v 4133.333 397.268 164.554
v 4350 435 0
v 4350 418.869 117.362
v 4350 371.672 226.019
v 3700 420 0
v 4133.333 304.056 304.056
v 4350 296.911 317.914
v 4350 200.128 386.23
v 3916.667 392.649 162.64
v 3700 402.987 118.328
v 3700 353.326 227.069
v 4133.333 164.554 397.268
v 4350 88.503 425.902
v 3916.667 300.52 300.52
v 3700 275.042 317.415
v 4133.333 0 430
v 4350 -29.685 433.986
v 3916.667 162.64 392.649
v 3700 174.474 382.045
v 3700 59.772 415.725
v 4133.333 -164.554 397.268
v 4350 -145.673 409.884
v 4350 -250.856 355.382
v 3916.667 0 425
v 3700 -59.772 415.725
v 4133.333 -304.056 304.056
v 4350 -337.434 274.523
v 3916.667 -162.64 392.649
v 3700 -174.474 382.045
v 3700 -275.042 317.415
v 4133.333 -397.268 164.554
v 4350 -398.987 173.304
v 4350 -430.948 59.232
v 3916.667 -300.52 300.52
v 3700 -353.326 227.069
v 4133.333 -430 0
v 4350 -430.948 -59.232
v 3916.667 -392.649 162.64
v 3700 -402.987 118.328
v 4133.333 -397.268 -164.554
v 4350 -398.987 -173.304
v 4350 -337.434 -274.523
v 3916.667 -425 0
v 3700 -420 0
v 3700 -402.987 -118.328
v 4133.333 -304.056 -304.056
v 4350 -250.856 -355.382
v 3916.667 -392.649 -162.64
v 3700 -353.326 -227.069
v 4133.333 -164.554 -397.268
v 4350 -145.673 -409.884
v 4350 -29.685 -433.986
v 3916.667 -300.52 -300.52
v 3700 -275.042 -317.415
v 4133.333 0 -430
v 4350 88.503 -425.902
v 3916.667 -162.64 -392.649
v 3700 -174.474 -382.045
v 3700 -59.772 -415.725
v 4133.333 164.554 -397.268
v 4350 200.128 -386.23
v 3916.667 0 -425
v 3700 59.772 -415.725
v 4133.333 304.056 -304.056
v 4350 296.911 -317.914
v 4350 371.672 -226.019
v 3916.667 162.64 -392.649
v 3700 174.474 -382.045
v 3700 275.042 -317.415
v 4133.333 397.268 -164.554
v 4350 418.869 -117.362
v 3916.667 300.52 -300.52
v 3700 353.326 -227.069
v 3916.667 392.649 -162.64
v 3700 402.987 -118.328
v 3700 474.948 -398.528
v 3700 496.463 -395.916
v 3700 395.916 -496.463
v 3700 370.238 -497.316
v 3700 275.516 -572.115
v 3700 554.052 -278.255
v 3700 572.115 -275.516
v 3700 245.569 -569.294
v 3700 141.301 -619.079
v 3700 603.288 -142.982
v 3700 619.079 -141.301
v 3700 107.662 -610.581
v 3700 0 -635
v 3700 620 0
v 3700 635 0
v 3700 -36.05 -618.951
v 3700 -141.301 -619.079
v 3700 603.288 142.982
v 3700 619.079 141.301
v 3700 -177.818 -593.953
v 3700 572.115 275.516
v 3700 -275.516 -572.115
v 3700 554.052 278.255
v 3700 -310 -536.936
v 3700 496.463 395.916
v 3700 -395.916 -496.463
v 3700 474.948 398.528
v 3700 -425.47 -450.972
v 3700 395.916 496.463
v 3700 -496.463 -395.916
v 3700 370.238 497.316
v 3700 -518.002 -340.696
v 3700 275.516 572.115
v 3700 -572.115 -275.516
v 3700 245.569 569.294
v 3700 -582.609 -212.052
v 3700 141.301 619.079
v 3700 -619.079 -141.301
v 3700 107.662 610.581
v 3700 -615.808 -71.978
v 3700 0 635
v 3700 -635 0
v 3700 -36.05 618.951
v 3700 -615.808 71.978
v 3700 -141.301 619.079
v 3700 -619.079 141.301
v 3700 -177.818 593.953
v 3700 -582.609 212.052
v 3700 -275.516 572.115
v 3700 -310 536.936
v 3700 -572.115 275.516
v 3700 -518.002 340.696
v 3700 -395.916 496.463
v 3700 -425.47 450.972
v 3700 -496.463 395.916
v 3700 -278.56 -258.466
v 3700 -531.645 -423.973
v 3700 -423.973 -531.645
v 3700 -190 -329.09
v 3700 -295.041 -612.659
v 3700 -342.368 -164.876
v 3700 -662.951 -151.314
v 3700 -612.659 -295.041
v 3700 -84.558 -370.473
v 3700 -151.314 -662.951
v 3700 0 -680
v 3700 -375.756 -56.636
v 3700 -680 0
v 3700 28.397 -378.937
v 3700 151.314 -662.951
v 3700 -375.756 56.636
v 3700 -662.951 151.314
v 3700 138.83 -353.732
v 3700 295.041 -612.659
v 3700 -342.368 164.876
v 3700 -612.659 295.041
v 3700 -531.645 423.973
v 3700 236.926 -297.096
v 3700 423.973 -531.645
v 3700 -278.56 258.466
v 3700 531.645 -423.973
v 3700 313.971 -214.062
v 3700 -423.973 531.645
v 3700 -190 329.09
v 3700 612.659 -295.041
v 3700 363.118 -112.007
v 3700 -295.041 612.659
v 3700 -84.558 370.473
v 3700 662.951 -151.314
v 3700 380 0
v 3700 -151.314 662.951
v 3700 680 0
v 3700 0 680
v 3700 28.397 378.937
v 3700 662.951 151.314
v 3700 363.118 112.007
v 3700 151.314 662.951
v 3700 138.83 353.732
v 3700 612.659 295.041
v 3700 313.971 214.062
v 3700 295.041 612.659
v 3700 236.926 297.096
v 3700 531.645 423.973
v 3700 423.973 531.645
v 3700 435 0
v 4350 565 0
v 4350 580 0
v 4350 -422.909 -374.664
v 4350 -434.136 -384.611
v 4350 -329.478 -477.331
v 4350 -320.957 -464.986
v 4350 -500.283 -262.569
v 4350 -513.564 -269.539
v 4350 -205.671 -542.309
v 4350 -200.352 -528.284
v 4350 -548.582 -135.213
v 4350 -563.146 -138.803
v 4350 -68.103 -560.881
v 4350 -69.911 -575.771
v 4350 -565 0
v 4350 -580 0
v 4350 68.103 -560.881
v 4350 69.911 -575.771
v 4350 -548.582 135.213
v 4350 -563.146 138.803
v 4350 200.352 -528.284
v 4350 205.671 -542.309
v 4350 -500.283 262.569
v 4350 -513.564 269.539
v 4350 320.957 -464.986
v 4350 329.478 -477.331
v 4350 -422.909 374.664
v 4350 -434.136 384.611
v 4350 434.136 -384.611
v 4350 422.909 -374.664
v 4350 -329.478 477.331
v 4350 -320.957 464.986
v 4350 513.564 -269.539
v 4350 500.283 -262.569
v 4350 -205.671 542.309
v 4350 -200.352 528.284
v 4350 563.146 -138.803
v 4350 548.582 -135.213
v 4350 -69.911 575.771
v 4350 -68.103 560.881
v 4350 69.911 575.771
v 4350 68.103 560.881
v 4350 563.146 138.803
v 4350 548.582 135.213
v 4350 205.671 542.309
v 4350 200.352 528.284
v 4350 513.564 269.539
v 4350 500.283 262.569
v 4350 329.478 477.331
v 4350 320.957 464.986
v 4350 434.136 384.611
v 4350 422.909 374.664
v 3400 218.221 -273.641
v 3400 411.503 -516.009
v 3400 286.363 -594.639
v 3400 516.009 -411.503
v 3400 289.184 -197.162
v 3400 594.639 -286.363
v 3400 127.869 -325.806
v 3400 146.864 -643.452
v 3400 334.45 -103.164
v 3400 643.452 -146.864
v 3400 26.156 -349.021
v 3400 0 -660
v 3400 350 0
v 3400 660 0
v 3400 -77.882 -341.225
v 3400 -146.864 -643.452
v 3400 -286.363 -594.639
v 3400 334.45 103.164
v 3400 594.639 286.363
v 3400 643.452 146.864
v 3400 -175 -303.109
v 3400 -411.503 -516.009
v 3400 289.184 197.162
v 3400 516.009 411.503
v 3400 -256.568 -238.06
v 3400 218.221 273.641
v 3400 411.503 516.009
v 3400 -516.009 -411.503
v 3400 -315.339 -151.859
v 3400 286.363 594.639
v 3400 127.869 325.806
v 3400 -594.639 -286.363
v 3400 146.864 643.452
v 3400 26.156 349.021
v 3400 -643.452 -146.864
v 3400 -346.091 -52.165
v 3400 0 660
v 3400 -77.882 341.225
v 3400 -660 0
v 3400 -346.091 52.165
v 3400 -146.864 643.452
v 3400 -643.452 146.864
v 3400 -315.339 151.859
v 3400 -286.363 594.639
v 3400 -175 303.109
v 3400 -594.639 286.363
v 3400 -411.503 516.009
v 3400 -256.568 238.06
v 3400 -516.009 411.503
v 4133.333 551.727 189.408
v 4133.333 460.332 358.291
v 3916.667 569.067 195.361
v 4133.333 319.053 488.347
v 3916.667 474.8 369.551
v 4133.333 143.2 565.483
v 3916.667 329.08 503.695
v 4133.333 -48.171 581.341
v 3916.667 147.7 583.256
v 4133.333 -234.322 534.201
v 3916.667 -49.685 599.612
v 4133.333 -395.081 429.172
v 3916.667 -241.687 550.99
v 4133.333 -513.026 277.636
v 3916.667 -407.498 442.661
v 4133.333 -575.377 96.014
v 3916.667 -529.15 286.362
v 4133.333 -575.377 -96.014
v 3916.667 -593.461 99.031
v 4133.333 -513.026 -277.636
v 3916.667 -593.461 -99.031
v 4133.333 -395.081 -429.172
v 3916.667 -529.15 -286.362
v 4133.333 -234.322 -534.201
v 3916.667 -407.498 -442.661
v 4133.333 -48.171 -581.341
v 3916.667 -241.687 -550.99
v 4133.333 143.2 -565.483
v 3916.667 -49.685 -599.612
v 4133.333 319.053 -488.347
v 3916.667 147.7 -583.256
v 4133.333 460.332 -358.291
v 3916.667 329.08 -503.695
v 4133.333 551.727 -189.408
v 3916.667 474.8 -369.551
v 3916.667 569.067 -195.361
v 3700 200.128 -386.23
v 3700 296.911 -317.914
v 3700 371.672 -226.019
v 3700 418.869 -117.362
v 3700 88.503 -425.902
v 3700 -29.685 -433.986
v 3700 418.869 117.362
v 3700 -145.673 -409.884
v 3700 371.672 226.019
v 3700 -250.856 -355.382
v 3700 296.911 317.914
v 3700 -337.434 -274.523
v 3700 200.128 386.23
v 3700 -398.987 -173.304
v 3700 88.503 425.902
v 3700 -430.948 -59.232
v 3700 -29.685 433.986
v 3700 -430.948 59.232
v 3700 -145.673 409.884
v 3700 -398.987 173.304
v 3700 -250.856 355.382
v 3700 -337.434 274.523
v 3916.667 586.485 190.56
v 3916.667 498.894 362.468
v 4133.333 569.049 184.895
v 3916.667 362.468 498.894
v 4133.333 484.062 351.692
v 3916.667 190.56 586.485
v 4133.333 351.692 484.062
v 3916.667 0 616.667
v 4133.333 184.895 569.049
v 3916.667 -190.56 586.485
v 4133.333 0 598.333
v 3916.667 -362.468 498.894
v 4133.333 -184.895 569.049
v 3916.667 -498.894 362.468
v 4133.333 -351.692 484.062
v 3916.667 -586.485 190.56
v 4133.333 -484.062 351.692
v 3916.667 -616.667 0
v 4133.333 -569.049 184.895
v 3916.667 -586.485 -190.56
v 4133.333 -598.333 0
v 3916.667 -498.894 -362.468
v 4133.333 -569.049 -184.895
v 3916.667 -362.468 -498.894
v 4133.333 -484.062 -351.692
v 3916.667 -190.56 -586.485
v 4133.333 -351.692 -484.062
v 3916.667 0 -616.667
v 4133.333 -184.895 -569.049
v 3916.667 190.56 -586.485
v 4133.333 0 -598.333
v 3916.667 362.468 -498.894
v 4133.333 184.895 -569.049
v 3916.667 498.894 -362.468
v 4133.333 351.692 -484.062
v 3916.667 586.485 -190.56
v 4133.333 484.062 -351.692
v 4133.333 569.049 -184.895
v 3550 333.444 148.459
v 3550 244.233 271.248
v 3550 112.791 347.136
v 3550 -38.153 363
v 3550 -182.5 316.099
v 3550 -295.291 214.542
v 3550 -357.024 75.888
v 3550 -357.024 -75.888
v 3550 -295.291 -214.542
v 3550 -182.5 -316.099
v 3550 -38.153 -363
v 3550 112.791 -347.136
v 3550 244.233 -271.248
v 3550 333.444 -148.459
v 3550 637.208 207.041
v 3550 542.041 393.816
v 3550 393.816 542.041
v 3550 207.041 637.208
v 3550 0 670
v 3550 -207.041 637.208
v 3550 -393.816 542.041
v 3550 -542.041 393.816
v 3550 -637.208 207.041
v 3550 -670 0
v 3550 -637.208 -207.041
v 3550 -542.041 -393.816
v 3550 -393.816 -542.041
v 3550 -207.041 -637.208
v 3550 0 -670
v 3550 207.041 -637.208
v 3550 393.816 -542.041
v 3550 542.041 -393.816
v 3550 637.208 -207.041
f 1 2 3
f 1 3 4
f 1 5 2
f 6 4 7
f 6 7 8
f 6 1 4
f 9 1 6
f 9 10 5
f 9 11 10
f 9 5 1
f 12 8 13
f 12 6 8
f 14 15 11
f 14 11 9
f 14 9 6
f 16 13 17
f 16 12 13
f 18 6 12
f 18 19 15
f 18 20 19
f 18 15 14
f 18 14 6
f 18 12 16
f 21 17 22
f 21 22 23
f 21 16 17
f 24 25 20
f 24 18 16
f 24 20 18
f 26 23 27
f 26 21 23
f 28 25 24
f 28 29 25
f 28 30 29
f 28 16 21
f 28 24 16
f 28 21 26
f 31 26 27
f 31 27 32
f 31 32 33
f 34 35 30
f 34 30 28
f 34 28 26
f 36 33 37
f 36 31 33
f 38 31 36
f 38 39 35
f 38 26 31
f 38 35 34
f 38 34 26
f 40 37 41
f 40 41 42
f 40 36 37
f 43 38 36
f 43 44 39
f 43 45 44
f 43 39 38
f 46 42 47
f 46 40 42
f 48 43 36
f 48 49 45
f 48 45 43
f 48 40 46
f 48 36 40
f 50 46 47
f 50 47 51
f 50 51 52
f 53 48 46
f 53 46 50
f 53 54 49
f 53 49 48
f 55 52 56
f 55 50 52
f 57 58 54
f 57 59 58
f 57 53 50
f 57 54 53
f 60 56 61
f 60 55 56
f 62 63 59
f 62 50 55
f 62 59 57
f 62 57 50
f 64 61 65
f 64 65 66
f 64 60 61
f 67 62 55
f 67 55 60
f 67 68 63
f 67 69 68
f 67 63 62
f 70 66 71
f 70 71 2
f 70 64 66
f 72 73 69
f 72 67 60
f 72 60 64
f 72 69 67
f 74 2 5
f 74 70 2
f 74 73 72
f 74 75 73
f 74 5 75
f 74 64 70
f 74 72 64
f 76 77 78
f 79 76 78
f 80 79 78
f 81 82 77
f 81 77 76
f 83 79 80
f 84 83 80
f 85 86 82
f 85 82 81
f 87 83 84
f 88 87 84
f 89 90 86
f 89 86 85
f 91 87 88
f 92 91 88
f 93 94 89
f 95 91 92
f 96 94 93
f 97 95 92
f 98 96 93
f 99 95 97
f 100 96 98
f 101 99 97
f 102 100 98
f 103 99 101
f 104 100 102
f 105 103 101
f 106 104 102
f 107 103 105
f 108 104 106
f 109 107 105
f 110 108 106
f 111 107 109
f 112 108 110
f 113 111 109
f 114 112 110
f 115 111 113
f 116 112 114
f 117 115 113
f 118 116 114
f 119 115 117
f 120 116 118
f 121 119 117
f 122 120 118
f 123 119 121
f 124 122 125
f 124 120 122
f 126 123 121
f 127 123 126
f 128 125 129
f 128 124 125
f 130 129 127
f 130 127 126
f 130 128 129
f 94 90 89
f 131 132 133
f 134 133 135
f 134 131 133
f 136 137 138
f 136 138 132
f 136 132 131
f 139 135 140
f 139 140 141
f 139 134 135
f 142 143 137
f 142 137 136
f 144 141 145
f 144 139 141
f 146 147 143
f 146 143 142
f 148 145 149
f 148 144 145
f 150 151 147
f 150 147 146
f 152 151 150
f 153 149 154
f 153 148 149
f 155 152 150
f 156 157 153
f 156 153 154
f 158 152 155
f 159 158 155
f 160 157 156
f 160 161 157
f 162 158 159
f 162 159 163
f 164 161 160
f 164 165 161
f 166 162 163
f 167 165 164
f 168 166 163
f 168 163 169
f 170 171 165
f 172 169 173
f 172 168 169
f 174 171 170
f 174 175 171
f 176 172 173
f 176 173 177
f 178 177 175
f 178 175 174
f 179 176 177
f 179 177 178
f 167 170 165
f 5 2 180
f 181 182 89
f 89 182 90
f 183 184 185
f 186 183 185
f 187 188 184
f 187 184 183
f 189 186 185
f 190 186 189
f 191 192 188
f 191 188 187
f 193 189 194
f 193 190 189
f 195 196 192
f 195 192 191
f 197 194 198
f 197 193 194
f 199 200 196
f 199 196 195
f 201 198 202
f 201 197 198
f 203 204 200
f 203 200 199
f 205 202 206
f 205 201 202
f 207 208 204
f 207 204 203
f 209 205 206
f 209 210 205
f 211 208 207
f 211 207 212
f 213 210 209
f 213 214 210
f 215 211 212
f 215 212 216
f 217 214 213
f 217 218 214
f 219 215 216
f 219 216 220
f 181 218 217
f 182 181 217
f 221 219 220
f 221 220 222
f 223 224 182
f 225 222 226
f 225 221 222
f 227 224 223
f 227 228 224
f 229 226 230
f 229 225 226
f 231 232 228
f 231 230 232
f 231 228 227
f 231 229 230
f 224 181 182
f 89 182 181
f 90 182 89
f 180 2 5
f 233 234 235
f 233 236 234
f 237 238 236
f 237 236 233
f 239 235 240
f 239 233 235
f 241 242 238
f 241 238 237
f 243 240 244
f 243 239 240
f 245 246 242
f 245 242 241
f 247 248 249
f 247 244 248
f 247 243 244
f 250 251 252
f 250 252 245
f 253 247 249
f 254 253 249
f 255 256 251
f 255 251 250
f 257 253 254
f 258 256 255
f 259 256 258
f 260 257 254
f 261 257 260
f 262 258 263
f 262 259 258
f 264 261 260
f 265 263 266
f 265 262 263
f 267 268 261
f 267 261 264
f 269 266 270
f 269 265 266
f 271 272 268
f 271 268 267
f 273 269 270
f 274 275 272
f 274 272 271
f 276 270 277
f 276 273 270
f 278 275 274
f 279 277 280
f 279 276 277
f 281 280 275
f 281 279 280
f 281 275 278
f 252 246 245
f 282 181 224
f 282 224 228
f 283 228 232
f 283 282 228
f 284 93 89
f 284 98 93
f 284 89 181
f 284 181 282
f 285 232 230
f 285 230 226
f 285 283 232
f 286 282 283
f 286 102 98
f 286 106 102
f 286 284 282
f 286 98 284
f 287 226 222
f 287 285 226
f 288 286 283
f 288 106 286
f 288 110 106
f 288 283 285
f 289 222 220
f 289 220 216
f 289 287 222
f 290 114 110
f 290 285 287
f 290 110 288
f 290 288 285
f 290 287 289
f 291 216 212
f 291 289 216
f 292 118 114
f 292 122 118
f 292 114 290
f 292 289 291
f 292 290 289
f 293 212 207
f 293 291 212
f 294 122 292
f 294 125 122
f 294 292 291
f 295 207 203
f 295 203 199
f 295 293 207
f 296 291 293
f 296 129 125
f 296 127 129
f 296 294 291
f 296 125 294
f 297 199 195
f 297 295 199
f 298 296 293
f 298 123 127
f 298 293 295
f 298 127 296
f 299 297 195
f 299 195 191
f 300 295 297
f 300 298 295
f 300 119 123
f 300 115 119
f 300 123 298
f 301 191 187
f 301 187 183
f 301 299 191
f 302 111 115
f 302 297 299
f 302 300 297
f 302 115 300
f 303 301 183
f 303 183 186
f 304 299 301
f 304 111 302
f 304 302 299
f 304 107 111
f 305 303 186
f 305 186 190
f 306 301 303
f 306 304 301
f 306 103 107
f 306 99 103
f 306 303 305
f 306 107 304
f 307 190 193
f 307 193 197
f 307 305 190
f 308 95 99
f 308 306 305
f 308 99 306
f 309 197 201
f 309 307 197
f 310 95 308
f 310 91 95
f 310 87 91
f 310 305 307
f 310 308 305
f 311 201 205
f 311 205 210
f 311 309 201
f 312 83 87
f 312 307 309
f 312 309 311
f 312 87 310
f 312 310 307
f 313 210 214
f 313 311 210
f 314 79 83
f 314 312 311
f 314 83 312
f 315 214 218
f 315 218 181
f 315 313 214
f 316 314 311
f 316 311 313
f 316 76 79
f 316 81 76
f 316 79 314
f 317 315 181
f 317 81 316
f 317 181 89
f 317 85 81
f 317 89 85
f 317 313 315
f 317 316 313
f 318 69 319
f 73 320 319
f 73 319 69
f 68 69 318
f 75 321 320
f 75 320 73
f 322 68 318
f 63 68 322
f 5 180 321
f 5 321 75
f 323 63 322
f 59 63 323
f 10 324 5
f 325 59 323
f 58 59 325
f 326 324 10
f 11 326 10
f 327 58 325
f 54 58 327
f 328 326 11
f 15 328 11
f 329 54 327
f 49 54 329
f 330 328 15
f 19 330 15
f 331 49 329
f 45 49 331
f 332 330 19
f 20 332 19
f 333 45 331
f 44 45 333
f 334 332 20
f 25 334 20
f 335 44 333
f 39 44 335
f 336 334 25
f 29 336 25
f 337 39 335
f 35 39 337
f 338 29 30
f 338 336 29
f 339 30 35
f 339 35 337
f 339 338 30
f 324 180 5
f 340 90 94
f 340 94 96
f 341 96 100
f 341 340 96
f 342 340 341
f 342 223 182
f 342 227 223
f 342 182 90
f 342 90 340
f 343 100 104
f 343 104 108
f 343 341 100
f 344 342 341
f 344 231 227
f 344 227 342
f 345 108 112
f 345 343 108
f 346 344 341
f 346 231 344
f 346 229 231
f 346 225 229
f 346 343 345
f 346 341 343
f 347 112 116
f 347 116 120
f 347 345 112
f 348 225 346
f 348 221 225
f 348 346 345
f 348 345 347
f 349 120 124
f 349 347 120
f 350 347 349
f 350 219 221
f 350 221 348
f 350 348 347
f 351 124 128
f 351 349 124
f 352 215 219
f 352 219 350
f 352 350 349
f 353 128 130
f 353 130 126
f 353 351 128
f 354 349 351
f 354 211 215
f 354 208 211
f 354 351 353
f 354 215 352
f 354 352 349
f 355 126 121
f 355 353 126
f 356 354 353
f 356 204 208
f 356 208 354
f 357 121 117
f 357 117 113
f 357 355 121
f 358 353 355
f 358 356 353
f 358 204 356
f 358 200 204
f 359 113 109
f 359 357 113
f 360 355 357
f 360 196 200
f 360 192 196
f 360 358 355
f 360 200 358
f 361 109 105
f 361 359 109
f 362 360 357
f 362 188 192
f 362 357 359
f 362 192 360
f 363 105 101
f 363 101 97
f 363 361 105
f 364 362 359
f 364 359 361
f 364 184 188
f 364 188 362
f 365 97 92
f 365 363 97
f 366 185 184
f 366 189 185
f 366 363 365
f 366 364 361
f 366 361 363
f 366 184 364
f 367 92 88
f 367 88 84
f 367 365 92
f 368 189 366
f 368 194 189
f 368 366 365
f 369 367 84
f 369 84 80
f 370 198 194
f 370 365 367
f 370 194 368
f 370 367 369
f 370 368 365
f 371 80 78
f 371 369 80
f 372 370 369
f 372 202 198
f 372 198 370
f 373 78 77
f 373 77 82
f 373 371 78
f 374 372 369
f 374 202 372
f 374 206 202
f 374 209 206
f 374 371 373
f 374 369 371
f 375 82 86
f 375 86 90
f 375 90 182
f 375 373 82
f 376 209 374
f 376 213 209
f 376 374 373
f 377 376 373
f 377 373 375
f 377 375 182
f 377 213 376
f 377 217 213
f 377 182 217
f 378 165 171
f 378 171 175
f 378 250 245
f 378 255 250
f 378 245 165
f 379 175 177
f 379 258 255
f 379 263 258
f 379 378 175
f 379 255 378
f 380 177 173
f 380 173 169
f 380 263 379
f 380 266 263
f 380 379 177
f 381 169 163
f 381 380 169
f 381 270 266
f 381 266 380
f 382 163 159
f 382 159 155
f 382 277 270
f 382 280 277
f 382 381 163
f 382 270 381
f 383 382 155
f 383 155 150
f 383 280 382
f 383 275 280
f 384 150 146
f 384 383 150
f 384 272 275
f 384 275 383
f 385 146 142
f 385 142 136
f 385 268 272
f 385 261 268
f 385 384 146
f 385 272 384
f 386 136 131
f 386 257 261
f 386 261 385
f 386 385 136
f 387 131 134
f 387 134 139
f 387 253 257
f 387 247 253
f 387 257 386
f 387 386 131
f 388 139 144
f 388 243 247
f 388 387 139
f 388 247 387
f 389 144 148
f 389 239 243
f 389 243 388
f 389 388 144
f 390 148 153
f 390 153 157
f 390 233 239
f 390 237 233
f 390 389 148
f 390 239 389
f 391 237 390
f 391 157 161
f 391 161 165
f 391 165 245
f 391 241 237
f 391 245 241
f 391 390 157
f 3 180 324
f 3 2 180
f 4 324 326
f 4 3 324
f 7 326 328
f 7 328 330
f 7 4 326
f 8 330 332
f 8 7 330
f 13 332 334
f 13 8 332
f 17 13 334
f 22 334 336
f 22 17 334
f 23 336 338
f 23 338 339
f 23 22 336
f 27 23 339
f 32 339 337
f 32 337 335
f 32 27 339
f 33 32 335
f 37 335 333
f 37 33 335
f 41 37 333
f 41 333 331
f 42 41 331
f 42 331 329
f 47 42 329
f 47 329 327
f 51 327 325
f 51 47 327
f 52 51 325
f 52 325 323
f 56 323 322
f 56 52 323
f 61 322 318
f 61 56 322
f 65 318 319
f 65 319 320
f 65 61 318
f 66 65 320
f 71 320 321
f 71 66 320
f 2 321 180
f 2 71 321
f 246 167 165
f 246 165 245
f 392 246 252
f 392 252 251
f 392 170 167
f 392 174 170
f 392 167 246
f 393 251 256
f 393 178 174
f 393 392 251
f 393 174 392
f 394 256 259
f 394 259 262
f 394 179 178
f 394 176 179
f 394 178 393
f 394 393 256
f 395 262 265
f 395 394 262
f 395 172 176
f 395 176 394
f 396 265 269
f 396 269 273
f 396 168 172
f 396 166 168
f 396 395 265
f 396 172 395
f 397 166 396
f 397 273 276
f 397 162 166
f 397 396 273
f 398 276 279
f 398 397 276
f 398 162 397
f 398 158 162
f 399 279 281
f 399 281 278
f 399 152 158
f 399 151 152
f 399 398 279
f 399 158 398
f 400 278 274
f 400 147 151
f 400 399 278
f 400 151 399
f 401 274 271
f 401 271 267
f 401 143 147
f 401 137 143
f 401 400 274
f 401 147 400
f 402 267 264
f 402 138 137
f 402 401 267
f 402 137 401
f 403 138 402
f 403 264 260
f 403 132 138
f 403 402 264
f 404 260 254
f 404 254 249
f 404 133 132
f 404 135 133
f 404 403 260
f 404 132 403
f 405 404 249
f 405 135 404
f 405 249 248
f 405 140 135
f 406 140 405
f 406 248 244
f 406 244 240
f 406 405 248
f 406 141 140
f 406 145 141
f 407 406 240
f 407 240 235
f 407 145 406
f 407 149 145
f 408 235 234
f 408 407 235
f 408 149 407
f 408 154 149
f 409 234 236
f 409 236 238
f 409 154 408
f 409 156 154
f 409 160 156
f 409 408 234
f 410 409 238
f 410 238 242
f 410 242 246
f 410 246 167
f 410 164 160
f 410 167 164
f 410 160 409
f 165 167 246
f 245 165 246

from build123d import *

# Parameters (mm, degrees)
REVOLVE1_ANGLE = 359.999999589
REVOLVE2_ANGLE = 359.999999589
REVOLVE3_ANGLE = 359.999999589


with BuildPart() as part:
    # Sketch1 → Revolve1 (revolve)
    with BuildSketch(Plane.XY):
        Polygon((3400, 350), (3400, 660), (3700, 680), (3700, 380), align=None)
    revolve(axis=Axis((0, 0, 0), (1, 0, 0)), revolution_arc=REVOLVE1_ANGLE)


with BuildPart() as body_2:
    # Sketch2 → Revolve2 (revolve)
    with BuildSketch(Plane.XY):
        Polygon((3700, 620), (3700, 635), (4350, 580), (4350, 565), align=None)
    revolve(axis=Axis((0, 0, 0), (1, 0, 0)), revolution_arc=REVOLVE2_ANGLE)


with BuildPart() as body_3:
    # Sketch3 → Revolve3 (revolve)
    with BuildSketch(Plane.XY):
        Polygon((3700, 420), (3700, 435), (4350, 435), align=None)
    revolve(axis=Axis((0, 0, 0), (1, 0, 0)), revolution_arc=REVOLVE3_ANGLE)


solid = Compound([part.part, body_2.part, body_3.part])
